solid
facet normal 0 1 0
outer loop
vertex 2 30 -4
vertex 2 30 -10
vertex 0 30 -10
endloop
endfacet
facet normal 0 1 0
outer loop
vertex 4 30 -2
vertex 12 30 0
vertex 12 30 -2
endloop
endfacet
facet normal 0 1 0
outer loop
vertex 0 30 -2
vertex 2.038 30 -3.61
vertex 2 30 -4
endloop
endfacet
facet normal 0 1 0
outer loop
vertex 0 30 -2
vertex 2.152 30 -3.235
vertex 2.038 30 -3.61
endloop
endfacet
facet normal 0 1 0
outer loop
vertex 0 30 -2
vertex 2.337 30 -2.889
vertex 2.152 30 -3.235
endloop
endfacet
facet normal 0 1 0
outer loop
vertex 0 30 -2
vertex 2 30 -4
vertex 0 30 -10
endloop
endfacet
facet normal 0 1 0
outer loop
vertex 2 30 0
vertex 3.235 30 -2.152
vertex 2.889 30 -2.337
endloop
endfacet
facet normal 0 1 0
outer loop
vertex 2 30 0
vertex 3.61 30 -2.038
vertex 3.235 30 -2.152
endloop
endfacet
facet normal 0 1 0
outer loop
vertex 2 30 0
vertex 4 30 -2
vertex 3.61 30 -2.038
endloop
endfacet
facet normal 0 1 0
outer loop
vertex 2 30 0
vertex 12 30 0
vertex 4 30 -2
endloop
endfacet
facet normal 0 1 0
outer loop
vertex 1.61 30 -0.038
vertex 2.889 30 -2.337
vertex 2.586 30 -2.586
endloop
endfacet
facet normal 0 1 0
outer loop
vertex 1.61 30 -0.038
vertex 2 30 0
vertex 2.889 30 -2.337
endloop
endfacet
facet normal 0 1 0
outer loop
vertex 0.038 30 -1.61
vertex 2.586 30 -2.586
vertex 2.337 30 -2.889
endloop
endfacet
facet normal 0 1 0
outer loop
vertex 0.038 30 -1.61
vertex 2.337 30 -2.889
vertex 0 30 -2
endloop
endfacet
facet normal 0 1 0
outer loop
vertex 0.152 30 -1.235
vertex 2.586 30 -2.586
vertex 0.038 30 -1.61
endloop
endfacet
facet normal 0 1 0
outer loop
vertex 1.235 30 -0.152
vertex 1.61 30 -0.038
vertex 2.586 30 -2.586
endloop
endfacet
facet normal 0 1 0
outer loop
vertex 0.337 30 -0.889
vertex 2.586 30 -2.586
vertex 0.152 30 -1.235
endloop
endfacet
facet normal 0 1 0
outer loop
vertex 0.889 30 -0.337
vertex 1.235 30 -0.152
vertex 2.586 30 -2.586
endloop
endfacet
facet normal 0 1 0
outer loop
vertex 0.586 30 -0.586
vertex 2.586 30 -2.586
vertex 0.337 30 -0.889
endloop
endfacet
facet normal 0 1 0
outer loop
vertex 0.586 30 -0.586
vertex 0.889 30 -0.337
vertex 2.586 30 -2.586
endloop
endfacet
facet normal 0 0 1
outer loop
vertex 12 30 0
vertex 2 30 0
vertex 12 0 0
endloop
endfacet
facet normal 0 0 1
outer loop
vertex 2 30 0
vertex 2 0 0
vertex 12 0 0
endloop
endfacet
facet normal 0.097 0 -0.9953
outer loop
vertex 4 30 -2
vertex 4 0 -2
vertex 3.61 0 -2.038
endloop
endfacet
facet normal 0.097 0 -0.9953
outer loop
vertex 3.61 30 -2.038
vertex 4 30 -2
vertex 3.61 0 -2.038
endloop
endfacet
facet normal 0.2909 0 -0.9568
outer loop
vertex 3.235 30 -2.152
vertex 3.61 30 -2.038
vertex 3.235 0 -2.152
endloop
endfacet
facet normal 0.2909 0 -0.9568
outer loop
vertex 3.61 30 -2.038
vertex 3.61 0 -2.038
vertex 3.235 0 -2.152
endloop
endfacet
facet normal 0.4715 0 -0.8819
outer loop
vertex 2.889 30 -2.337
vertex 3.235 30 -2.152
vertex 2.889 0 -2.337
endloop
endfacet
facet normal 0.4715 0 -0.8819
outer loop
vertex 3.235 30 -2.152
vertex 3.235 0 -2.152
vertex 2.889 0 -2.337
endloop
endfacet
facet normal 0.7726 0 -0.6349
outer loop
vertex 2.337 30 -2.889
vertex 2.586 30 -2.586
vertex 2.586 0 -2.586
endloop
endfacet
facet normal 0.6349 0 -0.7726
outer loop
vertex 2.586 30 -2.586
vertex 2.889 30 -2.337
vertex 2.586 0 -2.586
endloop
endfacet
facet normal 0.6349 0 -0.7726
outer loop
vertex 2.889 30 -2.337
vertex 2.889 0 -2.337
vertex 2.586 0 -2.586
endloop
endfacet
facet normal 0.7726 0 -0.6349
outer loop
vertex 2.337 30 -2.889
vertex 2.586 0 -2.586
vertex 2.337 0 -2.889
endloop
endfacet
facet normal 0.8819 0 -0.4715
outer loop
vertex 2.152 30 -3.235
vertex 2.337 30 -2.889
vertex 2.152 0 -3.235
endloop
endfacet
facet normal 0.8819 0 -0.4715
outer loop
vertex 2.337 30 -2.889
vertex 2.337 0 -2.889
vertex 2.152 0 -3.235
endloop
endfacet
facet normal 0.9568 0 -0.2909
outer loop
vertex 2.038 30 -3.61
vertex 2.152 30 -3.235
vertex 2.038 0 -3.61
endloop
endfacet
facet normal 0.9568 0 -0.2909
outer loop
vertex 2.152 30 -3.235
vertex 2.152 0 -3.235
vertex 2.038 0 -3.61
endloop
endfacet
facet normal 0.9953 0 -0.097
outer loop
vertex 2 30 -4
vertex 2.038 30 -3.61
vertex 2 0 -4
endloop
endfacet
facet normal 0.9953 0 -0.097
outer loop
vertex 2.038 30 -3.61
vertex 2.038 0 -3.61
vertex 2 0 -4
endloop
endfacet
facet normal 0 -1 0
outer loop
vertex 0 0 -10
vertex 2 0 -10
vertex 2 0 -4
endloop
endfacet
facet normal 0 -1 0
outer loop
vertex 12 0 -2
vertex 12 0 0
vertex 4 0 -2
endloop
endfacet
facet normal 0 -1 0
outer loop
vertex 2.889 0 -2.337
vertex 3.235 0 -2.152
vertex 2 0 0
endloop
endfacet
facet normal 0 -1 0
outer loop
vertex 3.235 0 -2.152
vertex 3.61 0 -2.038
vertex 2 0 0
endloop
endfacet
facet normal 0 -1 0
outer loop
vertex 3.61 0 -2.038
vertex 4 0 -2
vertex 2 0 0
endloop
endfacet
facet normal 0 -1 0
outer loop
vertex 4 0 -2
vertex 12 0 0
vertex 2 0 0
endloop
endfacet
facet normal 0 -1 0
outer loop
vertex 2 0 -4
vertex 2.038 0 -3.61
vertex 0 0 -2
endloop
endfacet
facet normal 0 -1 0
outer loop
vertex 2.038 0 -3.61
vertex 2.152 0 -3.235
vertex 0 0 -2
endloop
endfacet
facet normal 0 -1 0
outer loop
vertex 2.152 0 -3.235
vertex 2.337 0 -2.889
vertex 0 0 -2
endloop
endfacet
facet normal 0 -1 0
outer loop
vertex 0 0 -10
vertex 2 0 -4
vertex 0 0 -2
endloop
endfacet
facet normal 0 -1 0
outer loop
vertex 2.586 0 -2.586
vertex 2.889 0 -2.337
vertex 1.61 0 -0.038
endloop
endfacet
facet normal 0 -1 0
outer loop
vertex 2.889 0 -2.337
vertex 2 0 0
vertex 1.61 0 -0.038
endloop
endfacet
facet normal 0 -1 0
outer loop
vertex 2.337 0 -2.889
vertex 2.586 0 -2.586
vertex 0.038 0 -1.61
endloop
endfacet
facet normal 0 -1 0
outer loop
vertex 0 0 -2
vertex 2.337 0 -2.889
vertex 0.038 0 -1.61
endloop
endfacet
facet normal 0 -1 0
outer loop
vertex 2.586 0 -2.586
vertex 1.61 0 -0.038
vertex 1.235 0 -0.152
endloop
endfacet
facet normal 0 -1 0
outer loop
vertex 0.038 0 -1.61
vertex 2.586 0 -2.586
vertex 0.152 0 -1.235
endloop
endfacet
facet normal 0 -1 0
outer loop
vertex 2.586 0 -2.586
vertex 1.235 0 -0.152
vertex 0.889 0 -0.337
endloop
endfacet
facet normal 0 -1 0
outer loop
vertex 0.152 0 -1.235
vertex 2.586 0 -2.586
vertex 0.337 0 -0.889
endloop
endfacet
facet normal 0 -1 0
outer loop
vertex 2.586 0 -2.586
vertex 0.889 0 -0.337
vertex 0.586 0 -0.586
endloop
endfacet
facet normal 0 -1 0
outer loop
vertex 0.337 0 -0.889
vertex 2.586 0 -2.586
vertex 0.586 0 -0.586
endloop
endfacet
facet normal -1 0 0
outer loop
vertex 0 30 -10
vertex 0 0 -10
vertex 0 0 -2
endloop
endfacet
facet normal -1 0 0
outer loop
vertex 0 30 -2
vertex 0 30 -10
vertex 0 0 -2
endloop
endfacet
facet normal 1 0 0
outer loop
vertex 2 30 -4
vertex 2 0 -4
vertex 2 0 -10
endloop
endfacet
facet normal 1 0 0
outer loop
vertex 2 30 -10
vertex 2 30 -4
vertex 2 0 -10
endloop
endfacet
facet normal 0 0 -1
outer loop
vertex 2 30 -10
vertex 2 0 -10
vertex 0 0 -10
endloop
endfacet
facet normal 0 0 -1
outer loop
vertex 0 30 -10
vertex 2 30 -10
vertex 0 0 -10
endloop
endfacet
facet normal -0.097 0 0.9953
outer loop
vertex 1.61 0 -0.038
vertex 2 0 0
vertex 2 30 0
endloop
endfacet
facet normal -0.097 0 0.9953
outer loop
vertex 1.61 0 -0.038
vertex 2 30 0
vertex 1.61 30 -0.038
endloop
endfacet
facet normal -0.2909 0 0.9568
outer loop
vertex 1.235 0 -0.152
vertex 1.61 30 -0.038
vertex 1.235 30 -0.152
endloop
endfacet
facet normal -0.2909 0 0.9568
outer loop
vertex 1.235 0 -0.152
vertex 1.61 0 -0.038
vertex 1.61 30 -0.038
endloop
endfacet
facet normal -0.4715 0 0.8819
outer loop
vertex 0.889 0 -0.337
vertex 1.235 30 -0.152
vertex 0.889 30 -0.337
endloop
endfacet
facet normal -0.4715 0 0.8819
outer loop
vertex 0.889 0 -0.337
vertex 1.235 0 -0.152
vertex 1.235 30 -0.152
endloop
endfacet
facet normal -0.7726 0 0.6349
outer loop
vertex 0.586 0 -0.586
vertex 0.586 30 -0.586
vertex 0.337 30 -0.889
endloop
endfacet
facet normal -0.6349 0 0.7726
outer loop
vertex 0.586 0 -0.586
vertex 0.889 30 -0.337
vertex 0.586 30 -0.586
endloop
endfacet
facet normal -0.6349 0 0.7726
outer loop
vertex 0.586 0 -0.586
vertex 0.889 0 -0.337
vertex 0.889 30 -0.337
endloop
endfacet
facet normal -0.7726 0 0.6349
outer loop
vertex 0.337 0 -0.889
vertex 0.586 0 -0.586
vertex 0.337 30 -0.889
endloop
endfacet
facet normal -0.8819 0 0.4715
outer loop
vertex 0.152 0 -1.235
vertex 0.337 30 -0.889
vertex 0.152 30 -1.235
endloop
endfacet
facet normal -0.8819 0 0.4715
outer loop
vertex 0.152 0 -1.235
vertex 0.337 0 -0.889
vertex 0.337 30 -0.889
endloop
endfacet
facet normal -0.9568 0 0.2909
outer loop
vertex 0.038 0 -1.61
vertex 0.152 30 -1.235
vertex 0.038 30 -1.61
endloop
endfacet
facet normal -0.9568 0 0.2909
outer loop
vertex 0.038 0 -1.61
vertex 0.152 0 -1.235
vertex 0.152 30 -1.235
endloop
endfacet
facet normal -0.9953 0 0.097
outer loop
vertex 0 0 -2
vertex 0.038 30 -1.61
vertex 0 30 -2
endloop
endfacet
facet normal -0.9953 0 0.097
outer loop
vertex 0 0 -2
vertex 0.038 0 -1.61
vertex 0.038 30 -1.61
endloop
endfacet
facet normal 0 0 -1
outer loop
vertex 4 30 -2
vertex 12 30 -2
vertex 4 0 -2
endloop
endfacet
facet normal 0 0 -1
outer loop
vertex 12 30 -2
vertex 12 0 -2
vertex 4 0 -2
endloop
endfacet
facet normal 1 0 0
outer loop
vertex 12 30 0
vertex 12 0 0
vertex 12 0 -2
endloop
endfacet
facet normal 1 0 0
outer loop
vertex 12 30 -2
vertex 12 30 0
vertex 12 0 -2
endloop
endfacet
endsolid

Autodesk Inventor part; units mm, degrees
ref_plane "YZ Plane" through (0, 0, 0) normal (1, 0, 0) x (0, 1, 0)
ref_plane "XZ Plane" through (0, 0, 0) normal (0, 1, 0) x (-1, 0, 0)
ref_plane "XY Plane" through (0, 0, 0) normal (0, 0, 1) x (1, 0, 0)
sketch "Sketch1" plane through (0, 0, 0) normal (0, 1, 0) x (-1, 0, 0)
  line L0 (-2, 0) -> (-2, 0)
  line L1 (-2, -4) -> (-2, -10)
  line L2 (-2, -10) -> (0, -10)
  line L3 (0, -10) -> (0, -2)
  line L4 (-2, 0) -> (-12, 0)
  line L5 (-12, 0) -> (-12, -2)
  line L6 (-12, -2) -> (-4, -2)
  line L7 (-2, -2) -> (-2, 0)
  arc A0 (-2, -4) -> (-4, -2) centre (-4, -4) ccw
  arc A1 (0, -2) -> (-2, 0) centre (-2, -2) ccw
  point P0 (0, 0)
  dimension "d0" = 2
  dimension "d1" = 2
  dimension "d2" = 10
  dimension "d3" = 10
  dimension "d4" = 2
  dimension "d5" = 2
extrude "Extrusion1" add sketch "Sketch1" along normal blind 30
equation "\"d1\" = d0"
properties material "Aluminum 6061"
